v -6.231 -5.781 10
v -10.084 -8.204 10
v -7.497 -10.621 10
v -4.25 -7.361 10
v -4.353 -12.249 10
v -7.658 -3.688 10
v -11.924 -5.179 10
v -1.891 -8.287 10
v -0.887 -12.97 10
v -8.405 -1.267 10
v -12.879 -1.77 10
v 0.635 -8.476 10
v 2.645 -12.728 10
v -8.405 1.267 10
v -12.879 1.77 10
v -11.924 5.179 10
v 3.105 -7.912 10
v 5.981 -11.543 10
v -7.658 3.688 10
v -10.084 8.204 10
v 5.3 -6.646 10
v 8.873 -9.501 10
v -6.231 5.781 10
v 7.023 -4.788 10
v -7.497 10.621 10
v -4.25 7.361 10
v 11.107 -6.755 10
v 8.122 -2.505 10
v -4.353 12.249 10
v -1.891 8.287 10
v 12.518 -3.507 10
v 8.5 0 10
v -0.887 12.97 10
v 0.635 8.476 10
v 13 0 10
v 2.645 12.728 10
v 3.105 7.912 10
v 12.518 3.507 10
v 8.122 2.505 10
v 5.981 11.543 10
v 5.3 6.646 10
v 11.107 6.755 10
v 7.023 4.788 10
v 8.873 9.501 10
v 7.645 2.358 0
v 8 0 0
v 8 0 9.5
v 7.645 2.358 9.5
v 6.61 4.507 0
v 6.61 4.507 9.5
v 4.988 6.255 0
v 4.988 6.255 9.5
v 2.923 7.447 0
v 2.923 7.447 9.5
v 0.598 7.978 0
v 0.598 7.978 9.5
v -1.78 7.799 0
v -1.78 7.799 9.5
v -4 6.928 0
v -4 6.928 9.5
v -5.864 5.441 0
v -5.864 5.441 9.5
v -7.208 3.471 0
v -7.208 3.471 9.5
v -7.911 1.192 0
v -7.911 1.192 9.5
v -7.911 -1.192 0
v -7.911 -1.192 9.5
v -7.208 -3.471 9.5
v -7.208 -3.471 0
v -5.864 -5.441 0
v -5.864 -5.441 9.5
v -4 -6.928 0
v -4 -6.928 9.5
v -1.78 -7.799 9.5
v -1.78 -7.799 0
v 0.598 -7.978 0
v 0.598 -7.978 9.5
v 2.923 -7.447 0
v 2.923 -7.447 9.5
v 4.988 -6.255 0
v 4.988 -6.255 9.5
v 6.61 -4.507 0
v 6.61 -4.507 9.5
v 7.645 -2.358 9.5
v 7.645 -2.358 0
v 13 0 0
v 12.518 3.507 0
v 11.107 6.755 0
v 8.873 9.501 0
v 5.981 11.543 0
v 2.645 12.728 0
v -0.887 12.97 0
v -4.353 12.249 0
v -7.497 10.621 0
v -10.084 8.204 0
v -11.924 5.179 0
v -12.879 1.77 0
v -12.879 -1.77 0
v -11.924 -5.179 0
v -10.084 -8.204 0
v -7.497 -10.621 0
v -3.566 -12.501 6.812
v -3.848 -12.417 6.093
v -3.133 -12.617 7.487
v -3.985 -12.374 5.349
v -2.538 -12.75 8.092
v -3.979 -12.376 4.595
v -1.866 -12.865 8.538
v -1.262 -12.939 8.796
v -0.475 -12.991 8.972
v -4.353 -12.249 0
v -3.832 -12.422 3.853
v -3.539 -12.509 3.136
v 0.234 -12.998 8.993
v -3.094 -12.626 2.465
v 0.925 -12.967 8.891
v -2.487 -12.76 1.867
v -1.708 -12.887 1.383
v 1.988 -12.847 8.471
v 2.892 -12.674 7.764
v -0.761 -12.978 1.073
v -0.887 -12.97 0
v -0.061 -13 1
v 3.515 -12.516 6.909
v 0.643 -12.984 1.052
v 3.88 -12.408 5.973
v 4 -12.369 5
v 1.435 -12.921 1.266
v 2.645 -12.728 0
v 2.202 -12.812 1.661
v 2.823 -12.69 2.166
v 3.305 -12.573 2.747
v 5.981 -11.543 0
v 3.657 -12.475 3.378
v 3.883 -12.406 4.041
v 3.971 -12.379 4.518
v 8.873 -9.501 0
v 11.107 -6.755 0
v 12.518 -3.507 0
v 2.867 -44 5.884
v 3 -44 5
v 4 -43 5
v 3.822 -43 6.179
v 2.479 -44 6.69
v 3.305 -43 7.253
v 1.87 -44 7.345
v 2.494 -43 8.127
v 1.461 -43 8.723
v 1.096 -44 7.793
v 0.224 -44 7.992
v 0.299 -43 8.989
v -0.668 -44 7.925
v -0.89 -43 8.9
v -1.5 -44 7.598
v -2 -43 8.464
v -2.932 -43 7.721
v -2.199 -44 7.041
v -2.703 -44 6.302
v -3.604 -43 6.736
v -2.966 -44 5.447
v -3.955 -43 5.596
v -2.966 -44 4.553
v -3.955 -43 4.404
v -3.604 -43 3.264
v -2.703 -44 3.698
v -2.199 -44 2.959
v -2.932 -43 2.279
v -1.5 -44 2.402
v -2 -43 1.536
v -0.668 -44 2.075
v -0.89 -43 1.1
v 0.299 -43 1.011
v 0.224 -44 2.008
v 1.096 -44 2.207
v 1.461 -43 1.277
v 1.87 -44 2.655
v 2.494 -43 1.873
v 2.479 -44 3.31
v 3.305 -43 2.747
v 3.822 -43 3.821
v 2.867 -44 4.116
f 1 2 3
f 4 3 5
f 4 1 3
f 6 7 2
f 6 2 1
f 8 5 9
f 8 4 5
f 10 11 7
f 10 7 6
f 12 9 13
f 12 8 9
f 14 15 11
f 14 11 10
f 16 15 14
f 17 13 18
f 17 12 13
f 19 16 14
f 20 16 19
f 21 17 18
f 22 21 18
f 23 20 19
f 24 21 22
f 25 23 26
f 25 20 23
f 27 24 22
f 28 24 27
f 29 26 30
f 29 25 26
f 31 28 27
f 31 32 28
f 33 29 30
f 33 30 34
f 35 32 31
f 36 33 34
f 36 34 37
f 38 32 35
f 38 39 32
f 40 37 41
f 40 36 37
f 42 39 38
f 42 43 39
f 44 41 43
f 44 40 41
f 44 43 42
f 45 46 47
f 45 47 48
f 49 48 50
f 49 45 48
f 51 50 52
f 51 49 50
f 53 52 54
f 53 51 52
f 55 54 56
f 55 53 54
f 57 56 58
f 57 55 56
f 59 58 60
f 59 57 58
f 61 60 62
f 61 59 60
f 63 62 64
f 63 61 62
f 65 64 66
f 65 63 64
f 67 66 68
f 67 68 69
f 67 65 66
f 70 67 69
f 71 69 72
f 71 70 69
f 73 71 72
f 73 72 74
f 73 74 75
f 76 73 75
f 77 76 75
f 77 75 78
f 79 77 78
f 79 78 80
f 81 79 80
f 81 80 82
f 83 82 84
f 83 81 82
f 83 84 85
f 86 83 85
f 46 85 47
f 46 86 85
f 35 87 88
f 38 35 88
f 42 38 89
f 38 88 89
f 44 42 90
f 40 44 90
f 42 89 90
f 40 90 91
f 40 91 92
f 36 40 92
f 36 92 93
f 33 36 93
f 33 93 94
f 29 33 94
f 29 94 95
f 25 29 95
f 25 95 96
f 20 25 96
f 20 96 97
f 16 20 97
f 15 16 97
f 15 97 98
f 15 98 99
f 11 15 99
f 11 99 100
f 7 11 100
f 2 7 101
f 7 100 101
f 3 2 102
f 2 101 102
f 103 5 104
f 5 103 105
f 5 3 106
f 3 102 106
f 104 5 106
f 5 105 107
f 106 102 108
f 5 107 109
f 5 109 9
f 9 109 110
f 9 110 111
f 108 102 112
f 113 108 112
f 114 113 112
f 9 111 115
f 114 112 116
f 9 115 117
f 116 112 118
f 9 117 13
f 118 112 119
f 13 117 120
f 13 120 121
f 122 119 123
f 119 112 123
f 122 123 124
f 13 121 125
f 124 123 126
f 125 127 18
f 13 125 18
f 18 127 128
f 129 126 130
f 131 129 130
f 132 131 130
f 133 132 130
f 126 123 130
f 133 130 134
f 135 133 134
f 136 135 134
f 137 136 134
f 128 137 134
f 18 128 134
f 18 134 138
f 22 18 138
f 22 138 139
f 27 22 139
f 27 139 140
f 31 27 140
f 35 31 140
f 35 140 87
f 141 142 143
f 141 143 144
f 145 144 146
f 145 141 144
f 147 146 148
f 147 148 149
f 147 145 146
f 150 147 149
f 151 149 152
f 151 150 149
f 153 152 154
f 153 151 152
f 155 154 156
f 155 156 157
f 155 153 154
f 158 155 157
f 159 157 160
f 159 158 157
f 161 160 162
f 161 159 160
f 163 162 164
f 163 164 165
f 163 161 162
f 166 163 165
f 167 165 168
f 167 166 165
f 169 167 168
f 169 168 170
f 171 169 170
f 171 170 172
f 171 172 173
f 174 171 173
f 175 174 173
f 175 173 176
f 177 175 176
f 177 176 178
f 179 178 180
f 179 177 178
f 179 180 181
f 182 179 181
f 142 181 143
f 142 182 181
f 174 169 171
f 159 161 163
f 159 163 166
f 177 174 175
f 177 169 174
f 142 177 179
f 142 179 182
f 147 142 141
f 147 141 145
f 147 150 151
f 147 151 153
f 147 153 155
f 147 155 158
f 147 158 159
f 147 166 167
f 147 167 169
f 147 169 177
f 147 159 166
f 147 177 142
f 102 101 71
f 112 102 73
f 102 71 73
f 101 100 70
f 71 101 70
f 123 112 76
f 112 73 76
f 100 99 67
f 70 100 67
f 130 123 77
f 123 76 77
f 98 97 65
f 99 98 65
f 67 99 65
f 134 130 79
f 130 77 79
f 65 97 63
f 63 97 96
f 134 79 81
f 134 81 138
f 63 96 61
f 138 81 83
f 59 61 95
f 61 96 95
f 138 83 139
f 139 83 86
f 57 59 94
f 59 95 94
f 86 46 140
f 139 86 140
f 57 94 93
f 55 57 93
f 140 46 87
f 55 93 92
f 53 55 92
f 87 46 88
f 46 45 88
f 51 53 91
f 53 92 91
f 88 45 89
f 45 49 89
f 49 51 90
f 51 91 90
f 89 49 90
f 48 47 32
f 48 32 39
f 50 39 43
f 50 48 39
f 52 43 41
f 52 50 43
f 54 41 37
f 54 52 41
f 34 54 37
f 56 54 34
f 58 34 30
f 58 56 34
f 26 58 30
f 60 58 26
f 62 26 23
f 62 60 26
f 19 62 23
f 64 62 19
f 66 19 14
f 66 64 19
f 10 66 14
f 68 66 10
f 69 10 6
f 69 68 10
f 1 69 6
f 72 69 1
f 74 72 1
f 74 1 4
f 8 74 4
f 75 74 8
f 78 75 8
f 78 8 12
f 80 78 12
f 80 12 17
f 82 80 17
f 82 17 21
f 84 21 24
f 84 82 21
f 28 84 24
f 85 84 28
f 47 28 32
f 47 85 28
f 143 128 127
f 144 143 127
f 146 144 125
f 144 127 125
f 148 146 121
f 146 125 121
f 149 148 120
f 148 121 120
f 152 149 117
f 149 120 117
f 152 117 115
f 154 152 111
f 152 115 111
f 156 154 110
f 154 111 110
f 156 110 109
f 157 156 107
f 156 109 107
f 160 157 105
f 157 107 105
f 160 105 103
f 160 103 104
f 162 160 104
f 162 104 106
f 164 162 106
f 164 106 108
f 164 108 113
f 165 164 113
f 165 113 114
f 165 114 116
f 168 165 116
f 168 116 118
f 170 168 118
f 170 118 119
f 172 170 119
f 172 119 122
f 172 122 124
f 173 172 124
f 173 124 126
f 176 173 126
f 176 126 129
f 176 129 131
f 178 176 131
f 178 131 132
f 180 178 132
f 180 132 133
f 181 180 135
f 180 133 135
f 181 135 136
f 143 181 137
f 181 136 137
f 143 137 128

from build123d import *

# Parameters (mm, degrees)
SKETCH_R        = 13
SKETCH_R_2      = 8
PAD_DEPTH       = 10
SKETCH001_R     = 4
PAD001_DEPTH    = 35
CHAMFER_SIZE    = 1
CHAMFER001_SIZE = 0.5


with BuildPart() as part:
    # Sketch → Pad (new body)
    with BuildSketch(Plane.XY):
        Circle(SKETCH_R)
        Circle(SKETCH_R_2, mode=Mode.SUBTRACT)
    extrude(amount=PAD_DEPTH)

    # Sketch001 → Pad001 (join)
    with BuildSketch(Plane.XZ.offset(9)):
        with Locations((0, 5)):
            Circle(SKETCH001_R)
    extrude(amount=PAD001_DEPTH)

    # Chamfer
    chamfer_edges = [part.edges().sort_by_distance(p)[0] for p in [
        (-4, -44, 5),
    ]]
    chamfer(chamfer_edges, length=CHAMFER_SIZE)

    # Chamfer001
    chamfer001_edges = [part.edges().sort_by_distance(p)[0] for p in [
        (-8, 0, 10),
    ]]
    chamfer(chamfer001_edges, length=CHAMFER001_SIZE)


solid = part.part
